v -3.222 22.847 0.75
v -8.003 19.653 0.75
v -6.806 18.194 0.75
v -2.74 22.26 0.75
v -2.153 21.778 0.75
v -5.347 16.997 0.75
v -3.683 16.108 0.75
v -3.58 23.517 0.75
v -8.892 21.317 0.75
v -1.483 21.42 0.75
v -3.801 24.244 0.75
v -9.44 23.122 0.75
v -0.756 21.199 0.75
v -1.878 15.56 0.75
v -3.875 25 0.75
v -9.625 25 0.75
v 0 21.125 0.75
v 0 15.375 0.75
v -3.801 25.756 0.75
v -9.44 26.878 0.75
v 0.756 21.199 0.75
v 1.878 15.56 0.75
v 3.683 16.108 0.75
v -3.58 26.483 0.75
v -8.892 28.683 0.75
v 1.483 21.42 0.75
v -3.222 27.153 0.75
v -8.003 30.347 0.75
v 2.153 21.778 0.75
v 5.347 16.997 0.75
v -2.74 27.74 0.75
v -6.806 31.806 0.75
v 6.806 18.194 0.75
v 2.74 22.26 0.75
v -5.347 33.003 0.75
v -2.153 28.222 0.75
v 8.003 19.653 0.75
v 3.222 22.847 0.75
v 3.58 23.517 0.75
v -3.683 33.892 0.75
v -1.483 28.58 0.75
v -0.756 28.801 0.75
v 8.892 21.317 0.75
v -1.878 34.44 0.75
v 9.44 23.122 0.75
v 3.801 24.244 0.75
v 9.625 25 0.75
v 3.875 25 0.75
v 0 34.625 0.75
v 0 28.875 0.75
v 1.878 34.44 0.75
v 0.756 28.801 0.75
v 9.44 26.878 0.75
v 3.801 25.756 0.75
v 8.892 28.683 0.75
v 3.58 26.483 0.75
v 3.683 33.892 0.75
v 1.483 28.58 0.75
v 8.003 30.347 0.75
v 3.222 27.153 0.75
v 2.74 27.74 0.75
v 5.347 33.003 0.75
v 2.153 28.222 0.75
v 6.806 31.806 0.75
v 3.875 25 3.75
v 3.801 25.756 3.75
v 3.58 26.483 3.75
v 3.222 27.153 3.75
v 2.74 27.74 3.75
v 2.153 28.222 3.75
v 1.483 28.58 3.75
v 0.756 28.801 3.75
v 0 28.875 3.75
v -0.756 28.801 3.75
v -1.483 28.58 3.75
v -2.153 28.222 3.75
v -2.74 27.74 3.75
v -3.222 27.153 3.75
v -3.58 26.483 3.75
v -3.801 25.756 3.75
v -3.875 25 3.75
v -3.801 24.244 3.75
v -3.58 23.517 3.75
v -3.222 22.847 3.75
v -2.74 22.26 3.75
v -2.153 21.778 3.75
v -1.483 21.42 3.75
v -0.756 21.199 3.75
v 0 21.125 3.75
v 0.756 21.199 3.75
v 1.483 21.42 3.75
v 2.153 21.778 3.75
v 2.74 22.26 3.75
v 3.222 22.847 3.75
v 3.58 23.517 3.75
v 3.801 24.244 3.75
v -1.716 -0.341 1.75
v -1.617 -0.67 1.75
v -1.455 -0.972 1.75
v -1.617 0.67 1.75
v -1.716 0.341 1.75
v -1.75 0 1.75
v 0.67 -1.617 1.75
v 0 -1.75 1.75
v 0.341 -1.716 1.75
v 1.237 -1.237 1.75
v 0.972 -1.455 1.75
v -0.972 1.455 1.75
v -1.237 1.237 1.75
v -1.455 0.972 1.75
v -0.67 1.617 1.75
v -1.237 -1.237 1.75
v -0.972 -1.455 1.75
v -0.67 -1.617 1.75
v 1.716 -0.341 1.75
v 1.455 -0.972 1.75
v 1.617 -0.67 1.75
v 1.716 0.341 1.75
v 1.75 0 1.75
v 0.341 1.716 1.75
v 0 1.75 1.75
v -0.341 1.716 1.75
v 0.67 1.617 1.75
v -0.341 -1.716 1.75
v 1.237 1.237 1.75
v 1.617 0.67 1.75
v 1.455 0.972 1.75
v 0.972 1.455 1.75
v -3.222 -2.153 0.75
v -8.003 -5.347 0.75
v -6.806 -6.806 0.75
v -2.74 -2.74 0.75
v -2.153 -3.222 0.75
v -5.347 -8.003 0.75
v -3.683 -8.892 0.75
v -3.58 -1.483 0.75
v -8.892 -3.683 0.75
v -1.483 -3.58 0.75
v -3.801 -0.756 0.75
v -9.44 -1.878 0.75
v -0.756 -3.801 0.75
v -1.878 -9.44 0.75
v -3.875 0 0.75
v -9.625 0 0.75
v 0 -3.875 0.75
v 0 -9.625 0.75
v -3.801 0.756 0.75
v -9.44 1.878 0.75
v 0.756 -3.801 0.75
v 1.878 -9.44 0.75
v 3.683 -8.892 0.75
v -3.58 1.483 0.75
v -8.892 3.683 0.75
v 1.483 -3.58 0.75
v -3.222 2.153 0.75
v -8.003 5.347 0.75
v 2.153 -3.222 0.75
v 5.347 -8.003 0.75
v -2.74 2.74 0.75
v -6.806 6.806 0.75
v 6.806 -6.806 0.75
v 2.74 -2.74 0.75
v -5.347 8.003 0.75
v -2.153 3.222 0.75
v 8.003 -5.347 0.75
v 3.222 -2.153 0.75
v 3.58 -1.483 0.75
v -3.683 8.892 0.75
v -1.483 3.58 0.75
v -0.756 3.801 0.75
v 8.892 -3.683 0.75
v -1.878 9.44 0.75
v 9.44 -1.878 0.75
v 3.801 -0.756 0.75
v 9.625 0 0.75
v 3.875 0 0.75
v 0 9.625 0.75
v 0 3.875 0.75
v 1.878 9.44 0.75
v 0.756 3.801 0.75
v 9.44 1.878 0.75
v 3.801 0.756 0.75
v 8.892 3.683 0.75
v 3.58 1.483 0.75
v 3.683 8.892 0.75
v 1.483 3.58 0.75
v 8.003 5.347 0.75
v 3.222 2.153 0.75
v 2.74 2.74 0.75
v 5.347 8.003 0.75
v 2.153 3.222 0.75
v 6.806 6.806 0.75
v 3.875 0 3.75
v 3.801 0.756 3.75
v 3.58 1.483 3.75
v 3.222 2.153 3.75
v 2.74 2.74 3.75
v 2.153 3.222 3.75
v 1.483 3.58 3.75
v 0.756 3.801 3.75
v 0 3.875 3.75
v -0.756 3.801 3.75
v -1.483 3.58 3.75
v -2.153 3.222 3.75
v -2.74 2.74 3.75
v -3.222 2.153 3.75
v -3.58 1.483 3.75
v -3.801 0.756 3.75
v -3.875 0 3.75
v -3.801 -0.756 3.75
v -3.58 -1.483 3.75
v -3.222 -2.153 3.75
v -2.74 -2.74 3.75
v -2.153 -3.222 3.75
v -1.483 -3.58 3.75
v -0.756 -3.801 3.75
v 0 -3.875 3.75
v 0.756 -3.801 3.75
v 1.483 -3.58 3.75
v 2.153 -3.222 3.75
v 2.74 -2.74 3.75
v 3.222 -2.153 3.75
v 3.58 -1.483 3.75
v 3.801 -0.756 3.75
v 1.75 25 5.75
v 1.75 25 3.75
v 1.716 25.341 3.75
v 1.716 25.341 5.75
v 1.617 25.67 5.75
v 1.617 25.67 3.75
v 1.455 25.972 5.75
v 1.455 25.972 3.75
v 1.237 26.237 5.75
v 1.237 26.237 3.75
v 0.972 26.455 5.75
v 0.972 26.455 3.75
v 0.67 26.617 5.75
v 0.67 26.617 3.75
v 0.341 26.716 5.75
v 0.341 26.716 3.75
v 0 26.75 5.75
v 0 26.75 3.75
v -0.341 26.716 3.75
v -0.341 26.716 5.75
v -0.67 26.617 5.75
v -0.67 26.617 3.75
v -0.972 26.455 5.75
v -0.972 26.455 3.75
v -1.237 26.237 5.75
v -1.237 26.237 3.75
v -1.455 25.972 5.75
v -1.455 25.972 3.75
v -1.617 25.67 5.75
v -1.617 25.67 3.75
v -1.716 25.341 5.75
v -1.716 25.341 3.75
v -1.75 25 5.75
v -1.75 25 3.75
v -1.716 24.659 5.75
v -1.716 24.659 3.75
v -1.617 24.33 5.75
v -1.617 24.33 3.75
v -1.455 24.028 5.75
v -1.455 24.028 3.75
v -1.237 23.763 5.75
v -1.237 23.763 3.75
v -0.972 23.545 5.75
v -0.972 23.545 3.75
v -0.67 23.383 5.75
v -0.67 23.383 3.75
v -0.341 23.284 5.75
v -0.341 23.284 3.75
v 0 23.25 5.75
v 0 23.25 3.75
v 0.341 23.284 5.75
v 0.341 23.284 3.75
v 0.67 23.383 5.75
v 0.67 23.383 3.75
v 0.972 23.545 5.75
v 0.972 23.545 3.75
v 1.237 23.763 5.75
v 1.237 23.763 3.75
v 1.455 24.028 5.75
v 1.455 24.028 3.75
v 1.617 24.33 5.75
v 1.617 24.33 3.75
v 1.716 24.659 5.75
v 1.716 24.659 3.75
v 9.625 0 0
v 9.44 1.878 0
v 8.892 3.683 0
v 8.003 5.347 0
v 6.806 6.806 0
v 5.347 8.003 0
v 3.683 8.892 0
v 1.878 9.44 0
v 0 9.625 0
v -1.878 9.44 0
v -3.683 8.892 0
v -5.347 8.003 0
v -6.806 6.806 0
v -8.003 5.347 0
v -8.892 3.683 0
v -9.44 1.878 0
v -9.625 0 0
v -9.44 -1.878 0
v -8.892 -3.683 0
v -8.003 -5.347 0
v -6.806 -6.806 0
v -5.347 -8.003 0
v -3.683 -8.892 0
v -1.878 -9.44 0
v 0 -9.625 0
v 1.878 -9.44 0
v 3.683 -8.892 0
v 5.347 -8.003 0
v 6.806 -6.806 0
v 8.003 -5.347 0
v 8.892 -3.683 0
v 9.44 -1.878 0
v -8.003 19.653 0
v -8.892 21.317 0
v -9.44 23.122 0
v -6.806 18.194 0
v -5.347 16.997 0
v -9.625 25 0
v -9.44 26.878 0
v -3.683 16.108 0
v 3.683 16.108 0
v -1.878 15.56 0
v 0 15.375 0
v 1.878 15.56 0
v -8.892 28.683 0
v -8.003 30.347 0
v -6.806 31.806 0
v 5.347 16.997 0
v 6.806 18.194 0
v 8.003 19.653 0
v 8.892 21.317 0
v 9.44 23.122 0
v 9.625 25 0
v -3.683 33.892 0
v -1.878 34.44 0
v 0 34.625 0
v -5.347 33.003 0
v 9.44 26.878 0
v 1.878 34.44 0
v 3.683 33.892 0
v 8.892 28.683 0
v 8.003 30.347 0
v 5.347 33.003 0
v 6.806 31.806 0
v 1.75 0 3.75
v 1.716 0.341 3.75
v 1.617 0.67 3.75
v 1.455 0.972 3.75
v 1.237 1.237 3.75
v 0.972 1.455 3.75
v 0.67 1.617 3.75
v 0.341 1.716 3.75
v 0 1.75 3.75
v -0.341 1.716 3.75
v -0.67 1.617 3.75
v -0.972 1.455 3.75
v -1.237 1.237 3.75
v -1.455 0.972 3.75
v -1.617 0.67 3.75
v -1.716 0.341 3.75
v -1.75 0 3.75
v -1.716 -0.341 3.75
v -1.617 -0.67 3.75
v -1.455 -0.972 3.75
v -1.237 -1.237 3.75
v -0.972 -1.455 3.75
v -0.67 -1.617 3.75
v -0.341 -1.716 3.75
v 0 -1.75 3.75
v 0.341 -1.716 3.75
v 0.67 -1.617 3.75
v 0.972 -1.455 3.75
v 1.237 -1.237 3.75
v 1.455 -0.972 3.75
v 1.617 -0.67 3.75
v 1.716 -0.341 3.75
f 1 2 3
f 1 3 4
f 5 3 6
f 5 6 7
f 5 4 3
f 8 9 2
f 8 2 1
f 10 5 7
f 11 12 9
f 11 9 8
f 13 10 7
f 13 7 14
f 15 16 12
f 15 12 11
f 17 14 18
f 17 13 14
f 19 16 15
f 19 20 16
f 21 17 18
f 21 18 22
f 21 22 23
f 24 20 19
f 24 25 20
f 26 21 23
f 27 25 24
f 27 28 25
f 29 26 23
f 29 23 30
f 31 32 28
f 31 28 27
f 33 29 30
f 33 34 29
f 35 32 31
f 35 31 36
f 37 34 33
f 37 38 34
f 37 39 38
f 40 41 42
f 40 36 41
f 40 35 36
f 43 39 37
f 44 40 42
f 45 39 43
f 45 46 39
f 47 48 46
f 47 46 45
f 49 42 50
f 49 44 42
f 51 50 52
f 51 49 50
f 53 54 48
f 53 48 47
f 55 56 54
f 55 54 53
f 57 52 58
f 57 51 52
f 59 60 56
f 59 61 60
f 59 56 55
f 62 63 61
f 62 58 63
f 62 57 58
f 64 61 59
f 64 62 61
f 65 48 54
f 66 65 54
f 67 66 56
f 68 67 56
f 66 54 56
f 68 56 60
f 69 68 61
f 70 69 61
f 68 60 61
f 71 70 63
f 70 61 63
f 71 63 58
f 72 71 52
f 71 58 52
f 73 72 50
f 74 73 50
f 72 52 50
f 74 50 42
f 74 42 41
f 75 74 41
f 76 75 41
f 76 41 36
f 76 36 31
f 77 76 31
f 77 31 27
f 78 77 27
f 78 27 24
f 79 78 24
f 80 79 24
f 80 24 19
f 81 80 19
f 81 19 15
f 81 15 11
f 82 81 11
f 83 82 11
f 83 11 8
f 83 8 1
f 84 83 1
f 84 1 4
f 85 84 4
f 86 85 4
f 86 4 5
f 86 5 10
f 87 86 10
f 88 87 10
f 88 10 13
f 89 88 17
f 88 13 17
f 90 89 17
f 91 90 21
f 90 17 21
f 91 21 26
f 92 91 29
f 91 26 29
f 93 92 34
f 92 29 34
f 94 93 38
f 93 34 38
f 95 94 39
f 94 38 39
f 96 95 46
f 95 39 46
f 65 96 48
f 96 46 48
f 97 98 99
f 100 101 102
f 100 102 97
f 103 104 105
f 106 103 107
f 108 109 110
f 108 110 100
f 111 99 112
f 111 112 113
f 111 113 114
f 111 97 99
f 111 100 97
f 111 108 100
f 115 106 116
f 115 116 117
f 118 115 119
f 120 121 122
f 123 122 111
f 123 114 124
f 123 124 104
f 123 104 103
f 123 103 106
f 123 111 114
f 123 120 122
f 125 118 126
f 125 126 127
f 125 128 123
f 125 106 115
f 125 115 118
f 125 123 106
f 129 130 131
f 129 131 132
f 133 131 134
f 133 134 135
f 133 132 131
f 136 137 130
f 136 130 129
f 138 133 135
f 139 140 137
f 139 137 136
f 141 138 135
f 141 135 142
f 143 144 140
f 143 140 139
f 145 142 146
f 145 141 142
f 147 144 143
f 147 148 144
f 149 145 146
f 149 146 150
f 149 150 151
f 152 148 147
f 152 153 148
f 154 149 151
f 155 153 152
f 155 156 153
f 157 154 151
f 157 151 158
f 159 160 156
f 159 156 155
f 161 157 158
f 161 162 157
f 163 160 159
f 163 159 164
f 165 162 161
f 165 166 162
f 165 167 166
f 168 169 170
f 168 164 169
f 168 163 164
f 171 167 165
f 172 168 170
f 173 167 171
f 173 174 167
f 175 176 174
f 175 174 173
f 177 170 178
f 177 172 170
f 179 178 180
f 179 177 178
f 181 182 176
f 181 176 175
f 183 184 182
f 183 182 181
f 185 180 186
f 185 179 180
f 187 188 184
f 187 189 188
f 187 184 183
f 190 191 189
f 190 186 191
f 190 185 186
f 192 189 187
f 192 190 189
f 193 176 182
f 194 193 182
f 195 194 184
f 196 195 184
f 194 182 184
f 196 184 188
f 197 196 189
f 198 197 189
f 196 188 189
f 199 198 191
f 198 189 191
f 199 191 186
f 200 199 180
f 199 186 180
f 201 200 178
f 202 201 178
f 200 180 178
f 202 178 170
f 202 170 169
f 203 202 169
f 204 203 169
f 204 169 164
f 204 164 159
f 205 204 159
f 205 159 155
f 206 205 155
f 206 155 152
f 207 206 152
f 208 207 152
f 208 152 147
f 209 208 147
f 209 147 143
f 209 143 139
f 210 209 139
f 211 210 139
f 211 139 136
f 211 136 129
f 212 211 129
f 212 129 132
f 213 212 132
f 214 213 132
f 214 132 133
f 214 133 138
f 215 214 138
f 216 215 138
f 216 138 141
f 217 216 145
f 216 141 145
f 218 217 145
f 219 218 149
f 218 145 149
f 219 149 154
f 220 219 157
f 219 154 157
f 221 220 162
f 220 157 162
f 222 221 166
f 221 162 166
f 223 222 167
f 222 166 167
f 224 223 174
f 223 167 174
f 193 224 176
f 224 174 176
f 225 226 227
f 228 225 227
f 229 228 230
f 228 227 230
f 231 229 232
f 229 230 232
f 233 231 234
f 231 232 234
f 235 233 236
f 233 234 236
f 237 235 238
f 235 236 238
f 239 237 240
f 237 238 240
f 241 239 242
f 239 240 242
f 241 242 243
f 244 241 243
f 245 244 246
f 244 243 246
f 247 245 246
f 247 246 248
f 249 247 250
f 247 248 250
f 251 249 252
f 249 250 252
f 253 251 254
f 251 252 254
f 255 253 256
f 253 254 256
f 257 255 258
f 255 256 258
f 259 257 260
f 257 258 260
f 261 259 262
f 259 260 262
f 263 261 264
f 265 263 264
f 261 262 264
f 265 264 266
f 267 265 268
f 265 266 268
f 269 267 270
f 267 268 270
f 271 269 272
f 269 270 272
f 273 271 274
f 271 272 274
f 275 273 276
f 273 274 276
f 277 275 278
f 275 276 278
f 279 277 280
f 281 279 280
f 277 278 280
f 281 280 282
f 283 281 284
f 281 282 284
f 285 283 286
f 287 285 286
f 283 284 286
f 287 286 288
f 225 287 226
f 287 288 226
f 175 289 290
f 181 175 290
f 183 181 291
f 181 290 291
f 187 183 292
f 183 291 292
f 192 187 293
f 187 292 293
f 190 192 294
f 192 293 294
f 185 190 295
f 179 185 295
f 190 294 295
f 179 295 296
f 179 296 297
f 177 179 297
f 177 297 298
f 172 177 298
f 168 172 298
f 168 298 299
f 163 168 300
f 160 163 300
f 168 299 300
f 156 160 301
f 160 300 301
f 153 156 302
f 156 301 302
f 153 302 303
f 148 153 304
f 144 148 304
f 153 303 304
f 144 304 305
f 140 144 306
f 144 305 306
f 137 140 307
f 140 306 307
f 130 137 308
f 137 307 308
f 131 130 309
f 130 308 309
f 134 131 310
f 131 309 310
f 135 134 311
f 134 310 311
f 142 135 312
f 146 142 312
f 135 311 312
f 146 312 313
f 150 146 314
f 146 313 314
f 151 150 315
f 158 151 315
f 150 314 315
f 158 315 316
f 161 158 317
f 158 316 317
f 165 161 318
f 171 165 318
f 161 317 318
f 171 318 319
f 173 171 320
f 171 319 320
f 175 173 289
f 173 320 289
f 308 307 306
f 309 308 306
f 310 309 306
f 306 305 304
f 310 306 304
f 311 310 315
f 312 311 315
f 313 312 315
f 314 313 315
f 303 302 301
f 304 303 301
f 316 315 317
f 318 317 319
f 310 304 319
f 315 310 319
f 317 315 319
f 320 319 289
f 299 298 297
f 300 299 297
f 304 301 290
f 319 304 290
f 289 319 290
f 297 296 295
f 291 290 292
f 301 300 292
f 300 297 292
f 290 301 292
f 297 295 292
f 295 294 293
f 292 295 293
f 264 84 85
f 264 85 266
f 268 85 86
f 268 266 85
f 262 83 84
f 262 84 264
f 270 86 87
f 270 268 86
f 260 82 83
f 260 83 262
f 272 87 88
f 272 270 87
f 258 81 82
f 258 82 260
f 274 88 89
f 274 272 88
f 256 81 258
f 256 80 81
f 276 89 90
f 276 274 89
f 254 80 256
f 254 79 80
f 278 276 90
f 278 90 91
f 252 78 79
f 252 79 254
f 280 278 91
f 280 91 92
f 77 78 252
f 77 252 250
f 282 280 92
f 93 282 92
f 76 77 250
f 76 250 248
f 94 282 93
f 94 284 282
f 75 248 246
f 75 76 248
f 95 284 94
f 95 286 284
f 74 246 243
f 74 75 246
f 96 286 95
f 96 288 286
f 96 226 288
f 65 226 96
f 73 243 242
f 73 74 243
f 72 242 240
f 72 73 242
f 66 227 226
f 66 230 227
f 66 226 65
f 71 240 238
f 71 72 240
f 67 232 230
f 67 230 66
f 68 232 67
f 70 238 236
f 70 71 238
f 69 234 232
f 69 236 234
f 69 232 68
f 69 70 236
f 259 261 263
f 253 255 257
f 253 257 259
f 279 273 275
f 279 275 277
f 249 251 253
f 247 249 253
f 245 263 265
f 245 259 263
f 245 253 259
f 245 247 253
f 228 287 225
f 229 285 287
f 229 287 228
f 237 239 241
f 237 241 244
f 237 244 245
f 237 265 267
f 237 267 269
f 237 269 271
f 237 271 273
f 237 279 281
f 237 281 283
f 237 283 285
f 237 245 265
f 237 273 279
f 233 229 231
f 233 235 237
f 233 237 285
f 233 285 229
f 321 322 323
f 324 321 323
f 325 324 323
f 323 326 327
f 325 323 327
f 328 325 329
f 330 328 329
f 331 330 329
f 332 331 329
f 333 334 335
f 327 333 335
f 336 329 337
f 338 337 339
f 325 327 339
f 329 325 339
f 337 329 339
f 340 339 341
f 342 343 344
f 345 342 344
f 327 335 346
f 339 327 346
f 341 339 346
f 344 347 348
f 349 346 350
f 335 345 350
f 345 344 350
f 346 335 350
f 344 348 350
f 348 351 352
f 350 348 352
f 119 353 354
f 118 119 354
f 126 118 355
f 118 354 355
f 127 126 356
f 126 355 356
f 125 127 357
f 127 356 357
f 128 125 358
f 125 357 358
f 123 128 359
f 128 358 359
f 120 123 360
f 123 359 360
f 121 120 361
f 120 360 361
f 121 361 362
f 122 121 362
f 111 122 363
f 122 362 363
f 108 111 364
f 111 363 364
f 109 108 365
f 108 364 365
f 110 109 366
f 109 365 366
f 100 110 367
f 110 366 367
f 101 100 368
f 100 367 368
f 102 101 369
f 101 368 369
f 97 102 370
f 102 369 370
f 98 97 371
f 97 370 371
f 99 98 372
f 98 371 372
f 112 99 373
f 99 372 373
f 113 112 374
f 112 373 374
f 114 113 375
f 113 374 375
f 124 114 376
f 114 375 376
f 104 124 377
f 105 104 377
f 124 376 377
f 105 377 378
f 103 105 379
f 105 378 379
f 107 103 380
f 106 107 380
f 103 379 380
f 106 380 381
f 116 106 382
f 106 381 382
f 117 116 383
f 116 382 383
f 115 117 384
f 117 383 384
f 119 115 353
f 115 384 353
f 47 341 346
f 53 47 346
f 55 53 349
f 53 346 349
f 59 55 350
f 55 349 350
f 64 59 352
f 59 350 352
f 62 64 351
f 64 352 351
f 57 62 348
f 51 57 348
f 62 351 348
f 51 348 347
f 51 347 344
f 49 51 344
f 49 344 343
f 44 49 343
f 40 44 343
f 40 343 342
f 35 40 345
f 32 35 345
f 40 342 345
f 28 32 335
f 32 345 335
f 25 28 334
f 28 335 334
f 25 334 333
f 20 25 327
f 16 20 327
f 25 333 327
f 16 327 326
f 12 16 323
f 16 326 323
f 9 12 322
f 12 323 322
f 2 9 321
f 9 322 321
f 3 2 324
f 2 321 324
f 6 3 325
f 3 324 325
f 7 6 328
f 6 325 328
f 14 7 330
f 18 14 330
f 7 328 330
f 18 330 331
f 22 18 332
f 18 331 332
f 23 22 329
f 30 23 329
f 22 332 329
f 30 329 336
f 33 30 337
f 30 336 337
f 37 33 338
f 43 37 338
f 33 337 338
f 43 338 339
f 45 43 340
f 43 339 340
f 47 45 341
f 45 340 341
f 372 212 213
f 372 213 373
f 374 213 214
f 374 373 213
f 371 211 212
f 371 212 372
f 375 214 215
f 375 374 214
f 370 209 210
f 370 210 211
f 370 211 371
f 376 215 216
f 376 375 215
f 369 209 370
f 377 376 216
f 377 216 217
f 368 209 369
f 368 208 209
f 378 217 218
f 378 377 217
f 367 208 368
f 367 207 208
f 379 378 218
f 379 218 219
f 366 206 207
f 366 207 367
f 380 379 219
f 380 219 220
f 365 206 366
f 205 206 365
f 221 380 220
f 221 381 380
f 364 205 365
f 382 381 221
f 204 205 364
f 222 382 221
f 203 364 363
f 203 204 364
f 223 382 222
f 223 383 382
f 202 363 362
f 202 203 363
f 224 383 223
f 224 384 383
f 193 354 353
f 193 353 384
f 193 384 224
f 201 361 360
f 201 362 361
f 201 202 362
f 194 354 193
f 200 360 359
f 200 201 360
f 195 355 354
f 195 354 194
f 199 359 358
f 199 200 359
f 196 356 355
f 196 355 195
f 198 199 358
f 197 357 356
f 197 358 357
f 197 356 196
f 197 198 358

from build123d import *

# Parameters (mm, degrees)
F0_R     = 9.625
F0_R_2   = 3.875
F1_DEPTH = 0.75
F2_DEPTH = 3.75
F4_R     = 1.75
F5_DEPTH = 2
F6_DEPTH = 2


with BuildPart() as f1:
    # F0 (on Top) → F1 (new body)
    with BuildSketch(Plane.XY):
        Circle(F0_R)
        Circle(F0_R_2, mode=Mode.SUBTRACT)
    extrude(amount=F1_DEPTH)

    # F0 (on Top) → F2 (join)
    with BuildSketch(Plane.XY):
        Circle(F0_R_2)
    extrude(amount=F2_DEPTH)


with BuildPart() as f3_1:
    # F3: copy of F1
    add(f1.part.moved(Location((0, 25, 0))))

    # F4 (on face) → F5 (join)
    with BuildSketch(Plane.XY.offset(3.75)):
        with Locations((0, 25)):
            Circle(F4_R)
    extrude(amount=F5_DEPTH)


with BuildPart() as f1_1:
    add(f1.part)

    # F4 (on face) → F6 (cut)
    with BuildSketch(Plane.XY.offset(3.75)):
        Circle(F4_R)
    extrude(amount=-F6_DEPTH, mode=Mode.SUBTRACT)


solid = Compound([f3_1.part, f1_1.part])
